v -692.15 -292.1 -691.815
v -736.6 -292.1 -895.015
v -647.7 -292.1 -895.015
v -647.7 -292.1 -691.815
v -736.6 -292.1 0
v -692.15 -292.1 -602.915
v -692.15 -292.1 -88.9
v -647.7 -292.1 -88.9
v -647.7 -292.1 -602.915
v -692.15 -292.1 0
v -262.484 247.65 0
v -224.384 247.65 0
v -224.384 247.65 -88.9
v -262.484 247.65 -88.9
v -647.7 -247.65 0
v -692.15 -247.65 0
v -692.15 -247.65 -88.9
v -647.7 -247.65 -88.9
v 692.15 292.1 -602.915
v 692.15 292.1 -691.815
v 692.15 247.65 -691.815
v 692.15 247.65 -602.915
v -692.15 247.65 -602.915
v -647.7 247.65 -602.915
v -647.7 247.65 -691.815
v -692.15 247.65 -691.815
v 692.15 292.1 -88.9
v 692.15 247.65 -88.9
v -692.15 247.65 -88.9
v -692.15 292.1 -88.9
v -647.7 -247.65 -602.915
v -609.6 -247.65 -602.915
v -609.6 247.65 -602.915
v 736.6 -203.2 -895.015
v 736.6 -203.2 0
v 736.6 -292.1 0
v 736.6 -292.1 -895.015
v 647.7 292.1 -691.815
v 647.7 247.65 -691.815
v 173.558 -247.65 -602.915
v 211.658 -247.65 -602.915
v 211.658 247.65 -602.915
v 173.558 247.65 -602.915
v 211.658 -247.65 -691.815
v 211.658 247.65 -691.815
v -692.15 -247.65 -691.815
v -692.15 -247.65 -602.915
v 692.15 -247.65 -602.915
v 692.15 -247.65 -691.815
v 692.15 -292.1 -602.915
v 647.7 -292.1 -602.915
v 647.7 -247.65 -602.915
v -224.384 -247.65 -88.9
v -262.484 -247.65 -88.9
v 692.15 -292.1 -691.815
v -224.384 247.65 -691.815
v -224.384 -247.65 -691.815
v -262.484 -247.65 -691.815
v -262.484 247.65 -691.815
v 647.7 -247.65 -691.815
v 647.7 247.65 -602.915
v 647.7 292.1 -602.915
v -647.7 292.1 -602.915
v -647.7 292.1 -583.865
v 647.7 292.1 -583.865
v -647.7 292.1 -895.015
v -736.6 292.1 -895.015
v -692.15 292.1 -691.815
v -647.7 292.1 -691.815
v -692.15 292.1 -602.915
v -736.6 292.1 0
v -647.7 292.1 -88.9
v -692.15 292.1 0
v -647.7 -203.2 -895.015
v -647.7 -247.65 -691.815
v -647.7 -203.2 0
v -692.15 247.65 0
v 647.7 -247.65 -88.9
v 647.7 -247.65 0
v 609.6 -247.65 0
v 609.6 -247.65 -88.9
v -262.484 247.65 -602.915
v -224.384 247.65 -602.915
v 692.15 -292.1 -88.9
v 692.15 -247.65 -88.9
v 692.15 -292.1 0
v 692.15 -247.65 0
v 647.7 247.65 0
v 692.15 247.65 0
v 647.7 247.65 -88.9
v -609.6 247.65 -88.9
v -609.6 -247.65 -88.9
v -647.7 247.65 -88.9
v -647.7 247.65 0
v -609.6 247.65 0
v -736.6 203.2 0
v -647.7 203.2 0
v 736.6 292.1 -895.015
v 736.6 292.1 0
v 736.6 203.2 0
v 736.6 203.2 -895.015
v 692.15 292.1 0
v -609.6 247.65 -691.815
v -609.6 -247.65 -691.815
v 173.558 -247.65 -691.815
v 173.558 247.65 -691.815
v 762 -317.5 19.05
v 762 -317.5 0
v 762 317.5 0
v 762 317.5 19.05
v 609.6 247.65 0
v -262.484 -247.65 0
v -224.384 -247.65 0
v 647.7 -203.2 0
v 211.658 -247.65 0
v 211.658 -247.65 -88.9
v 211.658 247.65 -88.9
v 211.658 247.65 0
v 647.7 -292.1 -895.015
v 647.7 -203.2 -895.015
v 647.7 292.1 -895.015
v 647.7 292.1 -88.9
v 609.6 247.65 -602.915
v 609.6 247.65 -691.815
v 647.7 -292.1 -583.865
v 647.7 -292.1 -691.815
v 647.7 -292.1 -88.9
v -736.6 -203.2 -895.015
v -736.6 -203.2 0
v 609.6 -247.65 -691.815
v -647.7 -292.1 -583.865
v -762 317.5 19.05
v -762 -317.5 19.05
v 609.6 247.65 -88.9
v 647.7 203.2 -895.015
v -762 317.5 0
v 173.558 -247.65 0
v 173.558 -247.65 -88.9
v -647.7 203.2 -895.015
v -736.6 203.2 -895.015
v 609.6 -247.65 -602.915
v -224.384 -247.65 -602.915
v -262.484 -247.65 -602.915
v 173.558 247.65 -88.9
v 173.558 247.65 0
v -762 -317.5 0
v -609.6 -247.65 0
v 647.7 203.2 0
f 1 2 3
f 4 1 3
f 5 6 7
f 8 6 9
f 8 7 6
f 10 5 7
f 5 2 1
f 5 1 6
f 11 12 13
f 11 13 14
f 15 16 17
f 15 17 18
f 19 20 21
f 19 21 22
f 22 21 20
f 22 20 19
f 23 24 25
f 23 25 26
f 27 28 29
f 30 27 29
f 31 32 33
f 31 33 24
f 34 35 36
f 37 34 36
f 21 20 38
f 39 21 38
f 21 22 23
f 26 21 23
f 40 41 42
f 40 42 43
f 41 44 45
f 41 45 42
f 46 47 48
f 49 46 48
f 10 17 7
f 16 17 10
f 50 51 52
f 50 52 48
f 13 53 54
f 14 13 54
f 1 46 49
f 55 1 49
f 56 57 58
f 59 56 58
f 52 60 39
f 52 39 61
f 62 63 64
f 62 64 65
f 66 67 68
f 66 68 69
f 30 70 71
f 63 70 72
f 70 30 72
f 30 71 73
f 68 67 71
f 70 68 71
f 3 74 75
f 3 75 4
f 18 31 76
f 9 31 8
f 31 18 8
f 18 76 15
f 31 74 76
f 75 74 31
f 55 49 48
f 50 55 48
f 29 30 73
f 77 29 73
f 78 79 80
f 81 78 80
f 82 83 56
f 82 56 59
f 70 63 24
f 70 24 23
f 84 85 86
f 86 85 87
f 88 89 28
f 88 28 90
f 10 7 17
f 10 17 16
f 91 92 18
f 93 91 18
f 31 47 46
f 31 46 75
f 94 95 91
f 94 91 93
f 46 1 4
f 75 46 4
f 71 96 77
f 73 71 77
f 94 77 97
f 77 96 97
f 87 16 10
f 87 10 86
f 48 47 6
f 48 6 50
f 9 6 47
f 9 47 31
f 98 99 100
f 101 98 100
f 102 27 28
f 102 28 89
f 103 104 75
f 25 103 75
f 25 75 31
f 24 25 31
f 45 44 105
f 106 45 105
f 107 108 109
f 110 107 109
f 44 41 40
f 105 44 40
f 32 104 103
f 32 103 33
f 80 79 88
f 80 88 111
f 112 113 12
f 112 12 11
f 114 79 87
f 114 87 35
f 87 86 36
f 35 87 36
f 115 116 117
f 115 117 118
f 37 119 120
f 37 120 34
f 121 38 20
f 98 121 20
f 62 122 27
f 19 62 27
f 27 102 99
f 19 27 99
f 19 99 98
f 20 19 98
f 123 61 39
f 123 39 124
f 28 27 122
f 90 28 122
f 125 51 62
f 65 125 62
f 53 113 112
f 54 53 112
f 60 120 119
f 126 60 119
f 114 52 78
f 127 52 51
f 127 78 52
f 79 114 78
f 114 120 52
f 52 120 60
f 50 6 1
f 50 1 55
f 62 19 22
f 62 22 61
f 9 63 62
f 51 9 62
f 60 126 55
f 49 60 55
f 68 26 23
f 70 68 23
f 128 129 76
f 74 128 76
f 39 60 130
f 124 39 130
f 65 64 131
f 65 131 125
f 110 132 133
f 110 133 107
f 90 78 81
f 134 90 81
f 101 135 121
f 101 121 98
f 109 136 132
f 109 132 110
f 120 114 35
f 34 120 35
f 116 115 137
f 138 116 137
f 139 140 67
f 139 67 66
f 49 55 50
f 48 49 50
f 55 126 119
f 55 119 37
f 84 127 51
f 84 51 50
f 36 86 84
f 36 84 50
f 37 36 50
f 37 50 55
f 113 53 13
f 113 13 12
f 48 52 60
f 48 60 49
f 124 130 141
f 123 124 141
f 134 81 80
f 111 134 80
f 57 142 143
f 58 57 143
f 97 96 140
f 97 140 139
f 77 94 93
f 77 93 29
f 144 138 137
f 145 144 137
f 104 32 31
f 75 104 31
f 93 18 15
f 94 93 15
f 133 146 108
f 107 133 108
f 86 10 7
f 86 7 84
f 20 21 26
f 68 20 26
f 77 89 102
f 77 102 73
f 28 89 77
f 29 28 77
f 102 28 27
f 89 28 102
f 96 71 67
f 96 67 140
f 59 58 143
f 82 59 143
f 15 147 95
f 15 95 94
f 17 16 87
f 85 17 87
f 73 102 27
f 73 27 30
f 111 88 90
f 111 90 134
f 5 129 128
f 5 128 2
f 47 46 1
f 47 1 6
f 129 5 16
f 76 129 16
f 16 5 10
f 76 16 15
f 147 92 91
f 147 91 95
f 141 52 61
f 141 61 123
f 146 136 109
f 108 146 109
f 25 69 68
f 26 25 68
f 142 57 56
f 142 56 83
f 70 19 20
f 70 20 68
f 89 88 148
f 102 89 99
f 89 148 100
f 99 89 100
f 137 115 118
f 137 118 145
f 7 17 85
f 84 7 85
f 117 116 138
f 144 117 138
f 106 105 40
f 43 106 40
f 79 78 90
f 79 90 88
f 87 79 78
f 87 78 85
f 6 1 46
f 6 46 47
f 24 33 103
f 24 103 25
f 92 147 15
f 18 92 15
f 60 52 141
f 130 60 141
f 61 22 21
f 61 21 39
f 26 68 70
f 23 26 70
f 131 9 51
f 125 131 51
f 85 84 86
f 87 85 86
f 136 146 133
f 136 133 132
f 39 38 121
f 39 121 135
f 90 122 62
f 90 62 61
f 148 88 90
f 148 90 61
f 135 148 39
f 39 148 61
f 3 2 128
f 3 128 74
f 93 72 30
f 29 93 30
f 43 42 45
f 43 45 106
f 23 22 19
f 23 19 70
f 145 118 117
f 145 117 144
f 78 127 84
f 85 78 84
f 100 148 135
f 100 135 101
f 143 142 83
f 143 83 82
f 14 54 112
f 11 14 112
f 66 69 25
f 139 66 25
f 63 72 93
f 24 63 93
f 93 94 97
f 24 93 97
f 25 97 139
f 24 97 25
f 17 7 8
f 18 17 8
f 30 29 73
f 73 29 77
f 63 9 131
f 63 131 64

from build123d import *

# Parameters (mm, degrees)
F0_W      = 1524
F0_H      = 635
F1_DEPTH  = 19.05
F2_W      = 88.9
F2_H      = 88.9
F3_DEPTH  = 895.01472
F4_W      = 1384.3
F4_H      = 88.9
F5_DEPTH  = 44.45
F6_W      = 1384.3
F6_H      = 88.9
F7_DEPTH  = 44.45
F8_W      = 1384.3
F8_H      = 88.9
F9_DEPTH  = 44.45
F10_W     = 1384.3
F10_H     = 88.9
F11_DEPTH = 44.45
F12_W     = 38.1
F12_H     = 88.9
F13_DEPTH = 495.3
F14_W     = 1295.4
F14_H     = 584.2
F15_DEPTH = 19.05


with BuildPart() as f1:
    # F0 (on Top) → F1 (new body)
    with BuildSketch(Plane.XY):
        Rectangle(F0_W, F0_H)
    extrude(amount=F1_DEPTH)


with BuildPart() as f3:
    # F2 (on face) → F3 (new body)
    with BuildSketch(Plane(origin=(0, 0, 0), x_dir=(1, 0, 0), z_dir=(0, 0, -1))):
        with Locations((-692.15, 247.65)):
            Rectangle(F2_W, F2_H)
    extrude(amount=F3_DEPTH)


with BuildPart() as f3b:
    # F2 (on face) → F3, piece 2 (new body)
    with BuildSketch(Plane(origin=(0, 0, 0), x_dir=(1, 0, 0), z_dir=(0, 0, -1))):
        with Locations((692.15, 247.65)):
            Rectangle(F2_W, F2_H)
    extrude(amount=F3_DEPTH)


with BuildPart() as f3c:
    # F2 (on face) → F3, piece 3 (new body)
    with BuildSketch(Plane(origin=(0, 0, 0), x_dir=(1, 0, 0), z_dir=(0, 0, -1))):
        with Locations((-692.15, -247.65)):
            Rectangle(F2_W, F2_H)
    extrude(amount=F3_DEPTH)


with BuildPart() as f3d:
    # F2 (on face) → F3, piece 4 (new body)
    with BuildSketch(Plane(origin=(0, 0, 0), x_dir=(1, 0, 0), z_dir=(0, 0, -1))):
        with Locations((692.15, -247.65)):
            Rectangle(F2_W, F2_H)
    extrude(amount=F3_DEPTH)


with BuildPart() as f5_tool:
    # F4 (on face) → F5 (new body)
    with BuildSketch(Plane.XZ.offset(292.1)):
        with Locations((0, -44.45)):
            Rectangle(F4_W, F4_H)
        with Locations((0, -647.36472)):
            Rectangle(F4_W, F4_H)
    extrude(amount=-F5_DEPTH)


with BuildPart() as f3_1:
    add(f3.part)

    # F5: cut by f5_tool
    add(f5_tool.part, mode=Mode.SUBTRACT)


with BuildPart() as f3b_1:
    add(f3b.part)

    # F5: cut by f5_tool
    add(f5_tool.part, mode=Mode.SUBTRACT)


with BuildPart() as f7_tool:
    # F6 (on face) → F7 (new body)
    with BuildSketch(Plane(origin=(0, 292.1, 0), x_dir=(-1, 0, 0), z_dir=(0, 1, 0))):
        with Locations((0, -44.45)):
            Rectangle(F6_W, F6_H)
        with Locations((0, -647.36472)):
            Rectangle(F6_W, F6_H)
    extrude(amount=-F7_DEPTH)


with BuildPart() as f3c_1:
    add(f3c.part)

    # F7: cut by f7_tool
    add(f7_tool.part, mode=Mode.SUBTRACT)


with BuildPart() as f3d_1:
    add(f3d.part)

    # F7: cut by f7_tool
    add(f7_tool.part, mode=Mode.SUBTRACT)


with BuildPart() as f9:
    # F8 (on face) → F9 (new body, through all)
    with BuildSketch(Plane.XZ.offset(247.65)):
        with Locations((0, -44.45)):
            Rectangle(F8_W, F8_H)
    extrude(amount=F9_DEPTH)


with BuildPart() as f9b:
    # F8 (on face) → F9, piece 2 (new body, through all)
    with BuildSketch(Plane.XZ.offset(247.65)):
        with Locations((0, -647.36472)):
            Rectangle(F8_W, F8_H)
    extrude(amount=F9_DEPTH)


with BuildPart() as f11:
    # F10 (on face) → F11 (new body, through all)
    with BuildSketch(Plane(origin=(0, 247.65, 0), x_dir=(-1, 0, 0), z_dir=(0, 1, 0))):
        with Locations((0, -44.45)):
            Rectangle(F10_W, F10_H)
    extrude(amount=F11_DEPTH)


with BuildPart() as f11b:
    # F10 (on face) → F11, piece 2 (new body, through all)
    with BuildSketch(Plane(origin=(0, 247.65, 0), x_dir=(-1, 0, 0), z_dir=(0, 1, 0))):
        with Locations((0, -647.36472)):
            Rectangle(F10_W, F10_H)
    extrude(amount=F11_DEPTH)


with BuildPart() as f13:
    # F12 (on face) → F13 (new body, through all)
    with BuildSketch(Plane(origin=(0, -247.65, 0), x_dir=(-1, 0, 0), z_dir=(0, 1, 0))):
        with Locations((-628.65, -44.45)):
            Rectangle(F12_W, F12_H)
    extrude(amount=F13_DEPTH)


with BuildPart() as f13b:
    # F12 (on face) → F13, piece 2 (new body, through all)
    with BuildSketch(Plane(origin=(0, -247.65, 0), x_dir=(-1, 0, 0), z_dir=(0, 1, 0))):
        with Locations((628.65, -44.45)):
            Rectangle(F12_W, F12_H)
    extrude(amount=F13_DEPTH)


with BuildPart() as f13c:
    # F12 (on face) → F13, piece 3 (new body, through all)
    with BuildSketch(Plane(origin=(0, -247.65, 0), x_dir=(-1, 0, 0), z_dir=(0, 1, 0))):
        with Locations((-192.6082, -44.45)):
            Rectangle(F12_W, F12_H)
    extrude(amount=F13_DEPTH)


with BuildPart() as f13d:
    # F12 (on face) → F13, piece 4 (new body, through all)
    with BuildSketch(Plane(origin=(0, -247.65, 0), x_dir=(-1, 0, 0), z_dir=(0, 1, 0))):
        with Locations((243.4336, -44.45)):
            Rectangle(F12_W, F12_H)
    extrude(amount=F13_DEPTH)


with BuildPart() as f13e:
    # F12 (on face) → F13, piece 5 (new body, through all)
    with BuildSketch(Plane(origin=(0, -247.65, 0), x_dir=(-1, 0, 0), z_dir=(0, 1, 0))):
        with Locations((243.4336, -647.36472)):
            Rectangle(F12_W, F12_H)
    extrude(amount=F13_DEPTH)


with BuildPart() as f13f:
    # F12 (on face) → F13, piece 6 (new body, through all)
    with BuildSketch(Plane(origin=(0, -247.65, 0), x_dir=(-1, 0, 0), z_dir=(0, 1, 0))):
        with Locations((-192.6082, -647.36472)):
            Rectangle(F12_W, F12_H)
    extrude(amount=F13_DEPTH)


with BuildPart() as f13g:
    # F12 (on face) → F13, piece 7 (new body, through all)
    with BuildSketch(Plane(origin=(0, -247.65, 0), x_dir=(-1, 0, 0), z_dir=(0, 1, 0))):
        with Locations((-628.65, -647.36472)):
            Rectangle(F12_W, F12_H)
    extrude(amount=F13_DEPTH)


with BuildPart() as f13h:
    # F12 (on face) → F13, piece 8 (new body, through all)
    with BuildSketch(Plane(origin=(0, -247.65, 0), x_dir=(-1, 0, 0), z_dir=(0, 1, 0))):
        with Locations((628.65, -647.36472)):
            Rectangle(F12_W, F12_H)
    extrude(amount=F13_DEPTH)


with BuildPart() as f15:
    # F14 (on face) → F15 (new body)
    with BuildSketch(Plane.XY.offset(-602.91472)):
        Rectangle(F14_W, F14_H)
    extrude(amount=F15_DEPTH)


solid = Compound([f1.part, f3_1.part, f3b_1.part, f3c_1.part, f3d_1.part, f9.part, f9b.part, f11.part, f11b.part, f13.part, f13b.part, f13c.part, f13d.part, f13e.part, f13f.part, f13g.part, f13h.part, f15.part])
